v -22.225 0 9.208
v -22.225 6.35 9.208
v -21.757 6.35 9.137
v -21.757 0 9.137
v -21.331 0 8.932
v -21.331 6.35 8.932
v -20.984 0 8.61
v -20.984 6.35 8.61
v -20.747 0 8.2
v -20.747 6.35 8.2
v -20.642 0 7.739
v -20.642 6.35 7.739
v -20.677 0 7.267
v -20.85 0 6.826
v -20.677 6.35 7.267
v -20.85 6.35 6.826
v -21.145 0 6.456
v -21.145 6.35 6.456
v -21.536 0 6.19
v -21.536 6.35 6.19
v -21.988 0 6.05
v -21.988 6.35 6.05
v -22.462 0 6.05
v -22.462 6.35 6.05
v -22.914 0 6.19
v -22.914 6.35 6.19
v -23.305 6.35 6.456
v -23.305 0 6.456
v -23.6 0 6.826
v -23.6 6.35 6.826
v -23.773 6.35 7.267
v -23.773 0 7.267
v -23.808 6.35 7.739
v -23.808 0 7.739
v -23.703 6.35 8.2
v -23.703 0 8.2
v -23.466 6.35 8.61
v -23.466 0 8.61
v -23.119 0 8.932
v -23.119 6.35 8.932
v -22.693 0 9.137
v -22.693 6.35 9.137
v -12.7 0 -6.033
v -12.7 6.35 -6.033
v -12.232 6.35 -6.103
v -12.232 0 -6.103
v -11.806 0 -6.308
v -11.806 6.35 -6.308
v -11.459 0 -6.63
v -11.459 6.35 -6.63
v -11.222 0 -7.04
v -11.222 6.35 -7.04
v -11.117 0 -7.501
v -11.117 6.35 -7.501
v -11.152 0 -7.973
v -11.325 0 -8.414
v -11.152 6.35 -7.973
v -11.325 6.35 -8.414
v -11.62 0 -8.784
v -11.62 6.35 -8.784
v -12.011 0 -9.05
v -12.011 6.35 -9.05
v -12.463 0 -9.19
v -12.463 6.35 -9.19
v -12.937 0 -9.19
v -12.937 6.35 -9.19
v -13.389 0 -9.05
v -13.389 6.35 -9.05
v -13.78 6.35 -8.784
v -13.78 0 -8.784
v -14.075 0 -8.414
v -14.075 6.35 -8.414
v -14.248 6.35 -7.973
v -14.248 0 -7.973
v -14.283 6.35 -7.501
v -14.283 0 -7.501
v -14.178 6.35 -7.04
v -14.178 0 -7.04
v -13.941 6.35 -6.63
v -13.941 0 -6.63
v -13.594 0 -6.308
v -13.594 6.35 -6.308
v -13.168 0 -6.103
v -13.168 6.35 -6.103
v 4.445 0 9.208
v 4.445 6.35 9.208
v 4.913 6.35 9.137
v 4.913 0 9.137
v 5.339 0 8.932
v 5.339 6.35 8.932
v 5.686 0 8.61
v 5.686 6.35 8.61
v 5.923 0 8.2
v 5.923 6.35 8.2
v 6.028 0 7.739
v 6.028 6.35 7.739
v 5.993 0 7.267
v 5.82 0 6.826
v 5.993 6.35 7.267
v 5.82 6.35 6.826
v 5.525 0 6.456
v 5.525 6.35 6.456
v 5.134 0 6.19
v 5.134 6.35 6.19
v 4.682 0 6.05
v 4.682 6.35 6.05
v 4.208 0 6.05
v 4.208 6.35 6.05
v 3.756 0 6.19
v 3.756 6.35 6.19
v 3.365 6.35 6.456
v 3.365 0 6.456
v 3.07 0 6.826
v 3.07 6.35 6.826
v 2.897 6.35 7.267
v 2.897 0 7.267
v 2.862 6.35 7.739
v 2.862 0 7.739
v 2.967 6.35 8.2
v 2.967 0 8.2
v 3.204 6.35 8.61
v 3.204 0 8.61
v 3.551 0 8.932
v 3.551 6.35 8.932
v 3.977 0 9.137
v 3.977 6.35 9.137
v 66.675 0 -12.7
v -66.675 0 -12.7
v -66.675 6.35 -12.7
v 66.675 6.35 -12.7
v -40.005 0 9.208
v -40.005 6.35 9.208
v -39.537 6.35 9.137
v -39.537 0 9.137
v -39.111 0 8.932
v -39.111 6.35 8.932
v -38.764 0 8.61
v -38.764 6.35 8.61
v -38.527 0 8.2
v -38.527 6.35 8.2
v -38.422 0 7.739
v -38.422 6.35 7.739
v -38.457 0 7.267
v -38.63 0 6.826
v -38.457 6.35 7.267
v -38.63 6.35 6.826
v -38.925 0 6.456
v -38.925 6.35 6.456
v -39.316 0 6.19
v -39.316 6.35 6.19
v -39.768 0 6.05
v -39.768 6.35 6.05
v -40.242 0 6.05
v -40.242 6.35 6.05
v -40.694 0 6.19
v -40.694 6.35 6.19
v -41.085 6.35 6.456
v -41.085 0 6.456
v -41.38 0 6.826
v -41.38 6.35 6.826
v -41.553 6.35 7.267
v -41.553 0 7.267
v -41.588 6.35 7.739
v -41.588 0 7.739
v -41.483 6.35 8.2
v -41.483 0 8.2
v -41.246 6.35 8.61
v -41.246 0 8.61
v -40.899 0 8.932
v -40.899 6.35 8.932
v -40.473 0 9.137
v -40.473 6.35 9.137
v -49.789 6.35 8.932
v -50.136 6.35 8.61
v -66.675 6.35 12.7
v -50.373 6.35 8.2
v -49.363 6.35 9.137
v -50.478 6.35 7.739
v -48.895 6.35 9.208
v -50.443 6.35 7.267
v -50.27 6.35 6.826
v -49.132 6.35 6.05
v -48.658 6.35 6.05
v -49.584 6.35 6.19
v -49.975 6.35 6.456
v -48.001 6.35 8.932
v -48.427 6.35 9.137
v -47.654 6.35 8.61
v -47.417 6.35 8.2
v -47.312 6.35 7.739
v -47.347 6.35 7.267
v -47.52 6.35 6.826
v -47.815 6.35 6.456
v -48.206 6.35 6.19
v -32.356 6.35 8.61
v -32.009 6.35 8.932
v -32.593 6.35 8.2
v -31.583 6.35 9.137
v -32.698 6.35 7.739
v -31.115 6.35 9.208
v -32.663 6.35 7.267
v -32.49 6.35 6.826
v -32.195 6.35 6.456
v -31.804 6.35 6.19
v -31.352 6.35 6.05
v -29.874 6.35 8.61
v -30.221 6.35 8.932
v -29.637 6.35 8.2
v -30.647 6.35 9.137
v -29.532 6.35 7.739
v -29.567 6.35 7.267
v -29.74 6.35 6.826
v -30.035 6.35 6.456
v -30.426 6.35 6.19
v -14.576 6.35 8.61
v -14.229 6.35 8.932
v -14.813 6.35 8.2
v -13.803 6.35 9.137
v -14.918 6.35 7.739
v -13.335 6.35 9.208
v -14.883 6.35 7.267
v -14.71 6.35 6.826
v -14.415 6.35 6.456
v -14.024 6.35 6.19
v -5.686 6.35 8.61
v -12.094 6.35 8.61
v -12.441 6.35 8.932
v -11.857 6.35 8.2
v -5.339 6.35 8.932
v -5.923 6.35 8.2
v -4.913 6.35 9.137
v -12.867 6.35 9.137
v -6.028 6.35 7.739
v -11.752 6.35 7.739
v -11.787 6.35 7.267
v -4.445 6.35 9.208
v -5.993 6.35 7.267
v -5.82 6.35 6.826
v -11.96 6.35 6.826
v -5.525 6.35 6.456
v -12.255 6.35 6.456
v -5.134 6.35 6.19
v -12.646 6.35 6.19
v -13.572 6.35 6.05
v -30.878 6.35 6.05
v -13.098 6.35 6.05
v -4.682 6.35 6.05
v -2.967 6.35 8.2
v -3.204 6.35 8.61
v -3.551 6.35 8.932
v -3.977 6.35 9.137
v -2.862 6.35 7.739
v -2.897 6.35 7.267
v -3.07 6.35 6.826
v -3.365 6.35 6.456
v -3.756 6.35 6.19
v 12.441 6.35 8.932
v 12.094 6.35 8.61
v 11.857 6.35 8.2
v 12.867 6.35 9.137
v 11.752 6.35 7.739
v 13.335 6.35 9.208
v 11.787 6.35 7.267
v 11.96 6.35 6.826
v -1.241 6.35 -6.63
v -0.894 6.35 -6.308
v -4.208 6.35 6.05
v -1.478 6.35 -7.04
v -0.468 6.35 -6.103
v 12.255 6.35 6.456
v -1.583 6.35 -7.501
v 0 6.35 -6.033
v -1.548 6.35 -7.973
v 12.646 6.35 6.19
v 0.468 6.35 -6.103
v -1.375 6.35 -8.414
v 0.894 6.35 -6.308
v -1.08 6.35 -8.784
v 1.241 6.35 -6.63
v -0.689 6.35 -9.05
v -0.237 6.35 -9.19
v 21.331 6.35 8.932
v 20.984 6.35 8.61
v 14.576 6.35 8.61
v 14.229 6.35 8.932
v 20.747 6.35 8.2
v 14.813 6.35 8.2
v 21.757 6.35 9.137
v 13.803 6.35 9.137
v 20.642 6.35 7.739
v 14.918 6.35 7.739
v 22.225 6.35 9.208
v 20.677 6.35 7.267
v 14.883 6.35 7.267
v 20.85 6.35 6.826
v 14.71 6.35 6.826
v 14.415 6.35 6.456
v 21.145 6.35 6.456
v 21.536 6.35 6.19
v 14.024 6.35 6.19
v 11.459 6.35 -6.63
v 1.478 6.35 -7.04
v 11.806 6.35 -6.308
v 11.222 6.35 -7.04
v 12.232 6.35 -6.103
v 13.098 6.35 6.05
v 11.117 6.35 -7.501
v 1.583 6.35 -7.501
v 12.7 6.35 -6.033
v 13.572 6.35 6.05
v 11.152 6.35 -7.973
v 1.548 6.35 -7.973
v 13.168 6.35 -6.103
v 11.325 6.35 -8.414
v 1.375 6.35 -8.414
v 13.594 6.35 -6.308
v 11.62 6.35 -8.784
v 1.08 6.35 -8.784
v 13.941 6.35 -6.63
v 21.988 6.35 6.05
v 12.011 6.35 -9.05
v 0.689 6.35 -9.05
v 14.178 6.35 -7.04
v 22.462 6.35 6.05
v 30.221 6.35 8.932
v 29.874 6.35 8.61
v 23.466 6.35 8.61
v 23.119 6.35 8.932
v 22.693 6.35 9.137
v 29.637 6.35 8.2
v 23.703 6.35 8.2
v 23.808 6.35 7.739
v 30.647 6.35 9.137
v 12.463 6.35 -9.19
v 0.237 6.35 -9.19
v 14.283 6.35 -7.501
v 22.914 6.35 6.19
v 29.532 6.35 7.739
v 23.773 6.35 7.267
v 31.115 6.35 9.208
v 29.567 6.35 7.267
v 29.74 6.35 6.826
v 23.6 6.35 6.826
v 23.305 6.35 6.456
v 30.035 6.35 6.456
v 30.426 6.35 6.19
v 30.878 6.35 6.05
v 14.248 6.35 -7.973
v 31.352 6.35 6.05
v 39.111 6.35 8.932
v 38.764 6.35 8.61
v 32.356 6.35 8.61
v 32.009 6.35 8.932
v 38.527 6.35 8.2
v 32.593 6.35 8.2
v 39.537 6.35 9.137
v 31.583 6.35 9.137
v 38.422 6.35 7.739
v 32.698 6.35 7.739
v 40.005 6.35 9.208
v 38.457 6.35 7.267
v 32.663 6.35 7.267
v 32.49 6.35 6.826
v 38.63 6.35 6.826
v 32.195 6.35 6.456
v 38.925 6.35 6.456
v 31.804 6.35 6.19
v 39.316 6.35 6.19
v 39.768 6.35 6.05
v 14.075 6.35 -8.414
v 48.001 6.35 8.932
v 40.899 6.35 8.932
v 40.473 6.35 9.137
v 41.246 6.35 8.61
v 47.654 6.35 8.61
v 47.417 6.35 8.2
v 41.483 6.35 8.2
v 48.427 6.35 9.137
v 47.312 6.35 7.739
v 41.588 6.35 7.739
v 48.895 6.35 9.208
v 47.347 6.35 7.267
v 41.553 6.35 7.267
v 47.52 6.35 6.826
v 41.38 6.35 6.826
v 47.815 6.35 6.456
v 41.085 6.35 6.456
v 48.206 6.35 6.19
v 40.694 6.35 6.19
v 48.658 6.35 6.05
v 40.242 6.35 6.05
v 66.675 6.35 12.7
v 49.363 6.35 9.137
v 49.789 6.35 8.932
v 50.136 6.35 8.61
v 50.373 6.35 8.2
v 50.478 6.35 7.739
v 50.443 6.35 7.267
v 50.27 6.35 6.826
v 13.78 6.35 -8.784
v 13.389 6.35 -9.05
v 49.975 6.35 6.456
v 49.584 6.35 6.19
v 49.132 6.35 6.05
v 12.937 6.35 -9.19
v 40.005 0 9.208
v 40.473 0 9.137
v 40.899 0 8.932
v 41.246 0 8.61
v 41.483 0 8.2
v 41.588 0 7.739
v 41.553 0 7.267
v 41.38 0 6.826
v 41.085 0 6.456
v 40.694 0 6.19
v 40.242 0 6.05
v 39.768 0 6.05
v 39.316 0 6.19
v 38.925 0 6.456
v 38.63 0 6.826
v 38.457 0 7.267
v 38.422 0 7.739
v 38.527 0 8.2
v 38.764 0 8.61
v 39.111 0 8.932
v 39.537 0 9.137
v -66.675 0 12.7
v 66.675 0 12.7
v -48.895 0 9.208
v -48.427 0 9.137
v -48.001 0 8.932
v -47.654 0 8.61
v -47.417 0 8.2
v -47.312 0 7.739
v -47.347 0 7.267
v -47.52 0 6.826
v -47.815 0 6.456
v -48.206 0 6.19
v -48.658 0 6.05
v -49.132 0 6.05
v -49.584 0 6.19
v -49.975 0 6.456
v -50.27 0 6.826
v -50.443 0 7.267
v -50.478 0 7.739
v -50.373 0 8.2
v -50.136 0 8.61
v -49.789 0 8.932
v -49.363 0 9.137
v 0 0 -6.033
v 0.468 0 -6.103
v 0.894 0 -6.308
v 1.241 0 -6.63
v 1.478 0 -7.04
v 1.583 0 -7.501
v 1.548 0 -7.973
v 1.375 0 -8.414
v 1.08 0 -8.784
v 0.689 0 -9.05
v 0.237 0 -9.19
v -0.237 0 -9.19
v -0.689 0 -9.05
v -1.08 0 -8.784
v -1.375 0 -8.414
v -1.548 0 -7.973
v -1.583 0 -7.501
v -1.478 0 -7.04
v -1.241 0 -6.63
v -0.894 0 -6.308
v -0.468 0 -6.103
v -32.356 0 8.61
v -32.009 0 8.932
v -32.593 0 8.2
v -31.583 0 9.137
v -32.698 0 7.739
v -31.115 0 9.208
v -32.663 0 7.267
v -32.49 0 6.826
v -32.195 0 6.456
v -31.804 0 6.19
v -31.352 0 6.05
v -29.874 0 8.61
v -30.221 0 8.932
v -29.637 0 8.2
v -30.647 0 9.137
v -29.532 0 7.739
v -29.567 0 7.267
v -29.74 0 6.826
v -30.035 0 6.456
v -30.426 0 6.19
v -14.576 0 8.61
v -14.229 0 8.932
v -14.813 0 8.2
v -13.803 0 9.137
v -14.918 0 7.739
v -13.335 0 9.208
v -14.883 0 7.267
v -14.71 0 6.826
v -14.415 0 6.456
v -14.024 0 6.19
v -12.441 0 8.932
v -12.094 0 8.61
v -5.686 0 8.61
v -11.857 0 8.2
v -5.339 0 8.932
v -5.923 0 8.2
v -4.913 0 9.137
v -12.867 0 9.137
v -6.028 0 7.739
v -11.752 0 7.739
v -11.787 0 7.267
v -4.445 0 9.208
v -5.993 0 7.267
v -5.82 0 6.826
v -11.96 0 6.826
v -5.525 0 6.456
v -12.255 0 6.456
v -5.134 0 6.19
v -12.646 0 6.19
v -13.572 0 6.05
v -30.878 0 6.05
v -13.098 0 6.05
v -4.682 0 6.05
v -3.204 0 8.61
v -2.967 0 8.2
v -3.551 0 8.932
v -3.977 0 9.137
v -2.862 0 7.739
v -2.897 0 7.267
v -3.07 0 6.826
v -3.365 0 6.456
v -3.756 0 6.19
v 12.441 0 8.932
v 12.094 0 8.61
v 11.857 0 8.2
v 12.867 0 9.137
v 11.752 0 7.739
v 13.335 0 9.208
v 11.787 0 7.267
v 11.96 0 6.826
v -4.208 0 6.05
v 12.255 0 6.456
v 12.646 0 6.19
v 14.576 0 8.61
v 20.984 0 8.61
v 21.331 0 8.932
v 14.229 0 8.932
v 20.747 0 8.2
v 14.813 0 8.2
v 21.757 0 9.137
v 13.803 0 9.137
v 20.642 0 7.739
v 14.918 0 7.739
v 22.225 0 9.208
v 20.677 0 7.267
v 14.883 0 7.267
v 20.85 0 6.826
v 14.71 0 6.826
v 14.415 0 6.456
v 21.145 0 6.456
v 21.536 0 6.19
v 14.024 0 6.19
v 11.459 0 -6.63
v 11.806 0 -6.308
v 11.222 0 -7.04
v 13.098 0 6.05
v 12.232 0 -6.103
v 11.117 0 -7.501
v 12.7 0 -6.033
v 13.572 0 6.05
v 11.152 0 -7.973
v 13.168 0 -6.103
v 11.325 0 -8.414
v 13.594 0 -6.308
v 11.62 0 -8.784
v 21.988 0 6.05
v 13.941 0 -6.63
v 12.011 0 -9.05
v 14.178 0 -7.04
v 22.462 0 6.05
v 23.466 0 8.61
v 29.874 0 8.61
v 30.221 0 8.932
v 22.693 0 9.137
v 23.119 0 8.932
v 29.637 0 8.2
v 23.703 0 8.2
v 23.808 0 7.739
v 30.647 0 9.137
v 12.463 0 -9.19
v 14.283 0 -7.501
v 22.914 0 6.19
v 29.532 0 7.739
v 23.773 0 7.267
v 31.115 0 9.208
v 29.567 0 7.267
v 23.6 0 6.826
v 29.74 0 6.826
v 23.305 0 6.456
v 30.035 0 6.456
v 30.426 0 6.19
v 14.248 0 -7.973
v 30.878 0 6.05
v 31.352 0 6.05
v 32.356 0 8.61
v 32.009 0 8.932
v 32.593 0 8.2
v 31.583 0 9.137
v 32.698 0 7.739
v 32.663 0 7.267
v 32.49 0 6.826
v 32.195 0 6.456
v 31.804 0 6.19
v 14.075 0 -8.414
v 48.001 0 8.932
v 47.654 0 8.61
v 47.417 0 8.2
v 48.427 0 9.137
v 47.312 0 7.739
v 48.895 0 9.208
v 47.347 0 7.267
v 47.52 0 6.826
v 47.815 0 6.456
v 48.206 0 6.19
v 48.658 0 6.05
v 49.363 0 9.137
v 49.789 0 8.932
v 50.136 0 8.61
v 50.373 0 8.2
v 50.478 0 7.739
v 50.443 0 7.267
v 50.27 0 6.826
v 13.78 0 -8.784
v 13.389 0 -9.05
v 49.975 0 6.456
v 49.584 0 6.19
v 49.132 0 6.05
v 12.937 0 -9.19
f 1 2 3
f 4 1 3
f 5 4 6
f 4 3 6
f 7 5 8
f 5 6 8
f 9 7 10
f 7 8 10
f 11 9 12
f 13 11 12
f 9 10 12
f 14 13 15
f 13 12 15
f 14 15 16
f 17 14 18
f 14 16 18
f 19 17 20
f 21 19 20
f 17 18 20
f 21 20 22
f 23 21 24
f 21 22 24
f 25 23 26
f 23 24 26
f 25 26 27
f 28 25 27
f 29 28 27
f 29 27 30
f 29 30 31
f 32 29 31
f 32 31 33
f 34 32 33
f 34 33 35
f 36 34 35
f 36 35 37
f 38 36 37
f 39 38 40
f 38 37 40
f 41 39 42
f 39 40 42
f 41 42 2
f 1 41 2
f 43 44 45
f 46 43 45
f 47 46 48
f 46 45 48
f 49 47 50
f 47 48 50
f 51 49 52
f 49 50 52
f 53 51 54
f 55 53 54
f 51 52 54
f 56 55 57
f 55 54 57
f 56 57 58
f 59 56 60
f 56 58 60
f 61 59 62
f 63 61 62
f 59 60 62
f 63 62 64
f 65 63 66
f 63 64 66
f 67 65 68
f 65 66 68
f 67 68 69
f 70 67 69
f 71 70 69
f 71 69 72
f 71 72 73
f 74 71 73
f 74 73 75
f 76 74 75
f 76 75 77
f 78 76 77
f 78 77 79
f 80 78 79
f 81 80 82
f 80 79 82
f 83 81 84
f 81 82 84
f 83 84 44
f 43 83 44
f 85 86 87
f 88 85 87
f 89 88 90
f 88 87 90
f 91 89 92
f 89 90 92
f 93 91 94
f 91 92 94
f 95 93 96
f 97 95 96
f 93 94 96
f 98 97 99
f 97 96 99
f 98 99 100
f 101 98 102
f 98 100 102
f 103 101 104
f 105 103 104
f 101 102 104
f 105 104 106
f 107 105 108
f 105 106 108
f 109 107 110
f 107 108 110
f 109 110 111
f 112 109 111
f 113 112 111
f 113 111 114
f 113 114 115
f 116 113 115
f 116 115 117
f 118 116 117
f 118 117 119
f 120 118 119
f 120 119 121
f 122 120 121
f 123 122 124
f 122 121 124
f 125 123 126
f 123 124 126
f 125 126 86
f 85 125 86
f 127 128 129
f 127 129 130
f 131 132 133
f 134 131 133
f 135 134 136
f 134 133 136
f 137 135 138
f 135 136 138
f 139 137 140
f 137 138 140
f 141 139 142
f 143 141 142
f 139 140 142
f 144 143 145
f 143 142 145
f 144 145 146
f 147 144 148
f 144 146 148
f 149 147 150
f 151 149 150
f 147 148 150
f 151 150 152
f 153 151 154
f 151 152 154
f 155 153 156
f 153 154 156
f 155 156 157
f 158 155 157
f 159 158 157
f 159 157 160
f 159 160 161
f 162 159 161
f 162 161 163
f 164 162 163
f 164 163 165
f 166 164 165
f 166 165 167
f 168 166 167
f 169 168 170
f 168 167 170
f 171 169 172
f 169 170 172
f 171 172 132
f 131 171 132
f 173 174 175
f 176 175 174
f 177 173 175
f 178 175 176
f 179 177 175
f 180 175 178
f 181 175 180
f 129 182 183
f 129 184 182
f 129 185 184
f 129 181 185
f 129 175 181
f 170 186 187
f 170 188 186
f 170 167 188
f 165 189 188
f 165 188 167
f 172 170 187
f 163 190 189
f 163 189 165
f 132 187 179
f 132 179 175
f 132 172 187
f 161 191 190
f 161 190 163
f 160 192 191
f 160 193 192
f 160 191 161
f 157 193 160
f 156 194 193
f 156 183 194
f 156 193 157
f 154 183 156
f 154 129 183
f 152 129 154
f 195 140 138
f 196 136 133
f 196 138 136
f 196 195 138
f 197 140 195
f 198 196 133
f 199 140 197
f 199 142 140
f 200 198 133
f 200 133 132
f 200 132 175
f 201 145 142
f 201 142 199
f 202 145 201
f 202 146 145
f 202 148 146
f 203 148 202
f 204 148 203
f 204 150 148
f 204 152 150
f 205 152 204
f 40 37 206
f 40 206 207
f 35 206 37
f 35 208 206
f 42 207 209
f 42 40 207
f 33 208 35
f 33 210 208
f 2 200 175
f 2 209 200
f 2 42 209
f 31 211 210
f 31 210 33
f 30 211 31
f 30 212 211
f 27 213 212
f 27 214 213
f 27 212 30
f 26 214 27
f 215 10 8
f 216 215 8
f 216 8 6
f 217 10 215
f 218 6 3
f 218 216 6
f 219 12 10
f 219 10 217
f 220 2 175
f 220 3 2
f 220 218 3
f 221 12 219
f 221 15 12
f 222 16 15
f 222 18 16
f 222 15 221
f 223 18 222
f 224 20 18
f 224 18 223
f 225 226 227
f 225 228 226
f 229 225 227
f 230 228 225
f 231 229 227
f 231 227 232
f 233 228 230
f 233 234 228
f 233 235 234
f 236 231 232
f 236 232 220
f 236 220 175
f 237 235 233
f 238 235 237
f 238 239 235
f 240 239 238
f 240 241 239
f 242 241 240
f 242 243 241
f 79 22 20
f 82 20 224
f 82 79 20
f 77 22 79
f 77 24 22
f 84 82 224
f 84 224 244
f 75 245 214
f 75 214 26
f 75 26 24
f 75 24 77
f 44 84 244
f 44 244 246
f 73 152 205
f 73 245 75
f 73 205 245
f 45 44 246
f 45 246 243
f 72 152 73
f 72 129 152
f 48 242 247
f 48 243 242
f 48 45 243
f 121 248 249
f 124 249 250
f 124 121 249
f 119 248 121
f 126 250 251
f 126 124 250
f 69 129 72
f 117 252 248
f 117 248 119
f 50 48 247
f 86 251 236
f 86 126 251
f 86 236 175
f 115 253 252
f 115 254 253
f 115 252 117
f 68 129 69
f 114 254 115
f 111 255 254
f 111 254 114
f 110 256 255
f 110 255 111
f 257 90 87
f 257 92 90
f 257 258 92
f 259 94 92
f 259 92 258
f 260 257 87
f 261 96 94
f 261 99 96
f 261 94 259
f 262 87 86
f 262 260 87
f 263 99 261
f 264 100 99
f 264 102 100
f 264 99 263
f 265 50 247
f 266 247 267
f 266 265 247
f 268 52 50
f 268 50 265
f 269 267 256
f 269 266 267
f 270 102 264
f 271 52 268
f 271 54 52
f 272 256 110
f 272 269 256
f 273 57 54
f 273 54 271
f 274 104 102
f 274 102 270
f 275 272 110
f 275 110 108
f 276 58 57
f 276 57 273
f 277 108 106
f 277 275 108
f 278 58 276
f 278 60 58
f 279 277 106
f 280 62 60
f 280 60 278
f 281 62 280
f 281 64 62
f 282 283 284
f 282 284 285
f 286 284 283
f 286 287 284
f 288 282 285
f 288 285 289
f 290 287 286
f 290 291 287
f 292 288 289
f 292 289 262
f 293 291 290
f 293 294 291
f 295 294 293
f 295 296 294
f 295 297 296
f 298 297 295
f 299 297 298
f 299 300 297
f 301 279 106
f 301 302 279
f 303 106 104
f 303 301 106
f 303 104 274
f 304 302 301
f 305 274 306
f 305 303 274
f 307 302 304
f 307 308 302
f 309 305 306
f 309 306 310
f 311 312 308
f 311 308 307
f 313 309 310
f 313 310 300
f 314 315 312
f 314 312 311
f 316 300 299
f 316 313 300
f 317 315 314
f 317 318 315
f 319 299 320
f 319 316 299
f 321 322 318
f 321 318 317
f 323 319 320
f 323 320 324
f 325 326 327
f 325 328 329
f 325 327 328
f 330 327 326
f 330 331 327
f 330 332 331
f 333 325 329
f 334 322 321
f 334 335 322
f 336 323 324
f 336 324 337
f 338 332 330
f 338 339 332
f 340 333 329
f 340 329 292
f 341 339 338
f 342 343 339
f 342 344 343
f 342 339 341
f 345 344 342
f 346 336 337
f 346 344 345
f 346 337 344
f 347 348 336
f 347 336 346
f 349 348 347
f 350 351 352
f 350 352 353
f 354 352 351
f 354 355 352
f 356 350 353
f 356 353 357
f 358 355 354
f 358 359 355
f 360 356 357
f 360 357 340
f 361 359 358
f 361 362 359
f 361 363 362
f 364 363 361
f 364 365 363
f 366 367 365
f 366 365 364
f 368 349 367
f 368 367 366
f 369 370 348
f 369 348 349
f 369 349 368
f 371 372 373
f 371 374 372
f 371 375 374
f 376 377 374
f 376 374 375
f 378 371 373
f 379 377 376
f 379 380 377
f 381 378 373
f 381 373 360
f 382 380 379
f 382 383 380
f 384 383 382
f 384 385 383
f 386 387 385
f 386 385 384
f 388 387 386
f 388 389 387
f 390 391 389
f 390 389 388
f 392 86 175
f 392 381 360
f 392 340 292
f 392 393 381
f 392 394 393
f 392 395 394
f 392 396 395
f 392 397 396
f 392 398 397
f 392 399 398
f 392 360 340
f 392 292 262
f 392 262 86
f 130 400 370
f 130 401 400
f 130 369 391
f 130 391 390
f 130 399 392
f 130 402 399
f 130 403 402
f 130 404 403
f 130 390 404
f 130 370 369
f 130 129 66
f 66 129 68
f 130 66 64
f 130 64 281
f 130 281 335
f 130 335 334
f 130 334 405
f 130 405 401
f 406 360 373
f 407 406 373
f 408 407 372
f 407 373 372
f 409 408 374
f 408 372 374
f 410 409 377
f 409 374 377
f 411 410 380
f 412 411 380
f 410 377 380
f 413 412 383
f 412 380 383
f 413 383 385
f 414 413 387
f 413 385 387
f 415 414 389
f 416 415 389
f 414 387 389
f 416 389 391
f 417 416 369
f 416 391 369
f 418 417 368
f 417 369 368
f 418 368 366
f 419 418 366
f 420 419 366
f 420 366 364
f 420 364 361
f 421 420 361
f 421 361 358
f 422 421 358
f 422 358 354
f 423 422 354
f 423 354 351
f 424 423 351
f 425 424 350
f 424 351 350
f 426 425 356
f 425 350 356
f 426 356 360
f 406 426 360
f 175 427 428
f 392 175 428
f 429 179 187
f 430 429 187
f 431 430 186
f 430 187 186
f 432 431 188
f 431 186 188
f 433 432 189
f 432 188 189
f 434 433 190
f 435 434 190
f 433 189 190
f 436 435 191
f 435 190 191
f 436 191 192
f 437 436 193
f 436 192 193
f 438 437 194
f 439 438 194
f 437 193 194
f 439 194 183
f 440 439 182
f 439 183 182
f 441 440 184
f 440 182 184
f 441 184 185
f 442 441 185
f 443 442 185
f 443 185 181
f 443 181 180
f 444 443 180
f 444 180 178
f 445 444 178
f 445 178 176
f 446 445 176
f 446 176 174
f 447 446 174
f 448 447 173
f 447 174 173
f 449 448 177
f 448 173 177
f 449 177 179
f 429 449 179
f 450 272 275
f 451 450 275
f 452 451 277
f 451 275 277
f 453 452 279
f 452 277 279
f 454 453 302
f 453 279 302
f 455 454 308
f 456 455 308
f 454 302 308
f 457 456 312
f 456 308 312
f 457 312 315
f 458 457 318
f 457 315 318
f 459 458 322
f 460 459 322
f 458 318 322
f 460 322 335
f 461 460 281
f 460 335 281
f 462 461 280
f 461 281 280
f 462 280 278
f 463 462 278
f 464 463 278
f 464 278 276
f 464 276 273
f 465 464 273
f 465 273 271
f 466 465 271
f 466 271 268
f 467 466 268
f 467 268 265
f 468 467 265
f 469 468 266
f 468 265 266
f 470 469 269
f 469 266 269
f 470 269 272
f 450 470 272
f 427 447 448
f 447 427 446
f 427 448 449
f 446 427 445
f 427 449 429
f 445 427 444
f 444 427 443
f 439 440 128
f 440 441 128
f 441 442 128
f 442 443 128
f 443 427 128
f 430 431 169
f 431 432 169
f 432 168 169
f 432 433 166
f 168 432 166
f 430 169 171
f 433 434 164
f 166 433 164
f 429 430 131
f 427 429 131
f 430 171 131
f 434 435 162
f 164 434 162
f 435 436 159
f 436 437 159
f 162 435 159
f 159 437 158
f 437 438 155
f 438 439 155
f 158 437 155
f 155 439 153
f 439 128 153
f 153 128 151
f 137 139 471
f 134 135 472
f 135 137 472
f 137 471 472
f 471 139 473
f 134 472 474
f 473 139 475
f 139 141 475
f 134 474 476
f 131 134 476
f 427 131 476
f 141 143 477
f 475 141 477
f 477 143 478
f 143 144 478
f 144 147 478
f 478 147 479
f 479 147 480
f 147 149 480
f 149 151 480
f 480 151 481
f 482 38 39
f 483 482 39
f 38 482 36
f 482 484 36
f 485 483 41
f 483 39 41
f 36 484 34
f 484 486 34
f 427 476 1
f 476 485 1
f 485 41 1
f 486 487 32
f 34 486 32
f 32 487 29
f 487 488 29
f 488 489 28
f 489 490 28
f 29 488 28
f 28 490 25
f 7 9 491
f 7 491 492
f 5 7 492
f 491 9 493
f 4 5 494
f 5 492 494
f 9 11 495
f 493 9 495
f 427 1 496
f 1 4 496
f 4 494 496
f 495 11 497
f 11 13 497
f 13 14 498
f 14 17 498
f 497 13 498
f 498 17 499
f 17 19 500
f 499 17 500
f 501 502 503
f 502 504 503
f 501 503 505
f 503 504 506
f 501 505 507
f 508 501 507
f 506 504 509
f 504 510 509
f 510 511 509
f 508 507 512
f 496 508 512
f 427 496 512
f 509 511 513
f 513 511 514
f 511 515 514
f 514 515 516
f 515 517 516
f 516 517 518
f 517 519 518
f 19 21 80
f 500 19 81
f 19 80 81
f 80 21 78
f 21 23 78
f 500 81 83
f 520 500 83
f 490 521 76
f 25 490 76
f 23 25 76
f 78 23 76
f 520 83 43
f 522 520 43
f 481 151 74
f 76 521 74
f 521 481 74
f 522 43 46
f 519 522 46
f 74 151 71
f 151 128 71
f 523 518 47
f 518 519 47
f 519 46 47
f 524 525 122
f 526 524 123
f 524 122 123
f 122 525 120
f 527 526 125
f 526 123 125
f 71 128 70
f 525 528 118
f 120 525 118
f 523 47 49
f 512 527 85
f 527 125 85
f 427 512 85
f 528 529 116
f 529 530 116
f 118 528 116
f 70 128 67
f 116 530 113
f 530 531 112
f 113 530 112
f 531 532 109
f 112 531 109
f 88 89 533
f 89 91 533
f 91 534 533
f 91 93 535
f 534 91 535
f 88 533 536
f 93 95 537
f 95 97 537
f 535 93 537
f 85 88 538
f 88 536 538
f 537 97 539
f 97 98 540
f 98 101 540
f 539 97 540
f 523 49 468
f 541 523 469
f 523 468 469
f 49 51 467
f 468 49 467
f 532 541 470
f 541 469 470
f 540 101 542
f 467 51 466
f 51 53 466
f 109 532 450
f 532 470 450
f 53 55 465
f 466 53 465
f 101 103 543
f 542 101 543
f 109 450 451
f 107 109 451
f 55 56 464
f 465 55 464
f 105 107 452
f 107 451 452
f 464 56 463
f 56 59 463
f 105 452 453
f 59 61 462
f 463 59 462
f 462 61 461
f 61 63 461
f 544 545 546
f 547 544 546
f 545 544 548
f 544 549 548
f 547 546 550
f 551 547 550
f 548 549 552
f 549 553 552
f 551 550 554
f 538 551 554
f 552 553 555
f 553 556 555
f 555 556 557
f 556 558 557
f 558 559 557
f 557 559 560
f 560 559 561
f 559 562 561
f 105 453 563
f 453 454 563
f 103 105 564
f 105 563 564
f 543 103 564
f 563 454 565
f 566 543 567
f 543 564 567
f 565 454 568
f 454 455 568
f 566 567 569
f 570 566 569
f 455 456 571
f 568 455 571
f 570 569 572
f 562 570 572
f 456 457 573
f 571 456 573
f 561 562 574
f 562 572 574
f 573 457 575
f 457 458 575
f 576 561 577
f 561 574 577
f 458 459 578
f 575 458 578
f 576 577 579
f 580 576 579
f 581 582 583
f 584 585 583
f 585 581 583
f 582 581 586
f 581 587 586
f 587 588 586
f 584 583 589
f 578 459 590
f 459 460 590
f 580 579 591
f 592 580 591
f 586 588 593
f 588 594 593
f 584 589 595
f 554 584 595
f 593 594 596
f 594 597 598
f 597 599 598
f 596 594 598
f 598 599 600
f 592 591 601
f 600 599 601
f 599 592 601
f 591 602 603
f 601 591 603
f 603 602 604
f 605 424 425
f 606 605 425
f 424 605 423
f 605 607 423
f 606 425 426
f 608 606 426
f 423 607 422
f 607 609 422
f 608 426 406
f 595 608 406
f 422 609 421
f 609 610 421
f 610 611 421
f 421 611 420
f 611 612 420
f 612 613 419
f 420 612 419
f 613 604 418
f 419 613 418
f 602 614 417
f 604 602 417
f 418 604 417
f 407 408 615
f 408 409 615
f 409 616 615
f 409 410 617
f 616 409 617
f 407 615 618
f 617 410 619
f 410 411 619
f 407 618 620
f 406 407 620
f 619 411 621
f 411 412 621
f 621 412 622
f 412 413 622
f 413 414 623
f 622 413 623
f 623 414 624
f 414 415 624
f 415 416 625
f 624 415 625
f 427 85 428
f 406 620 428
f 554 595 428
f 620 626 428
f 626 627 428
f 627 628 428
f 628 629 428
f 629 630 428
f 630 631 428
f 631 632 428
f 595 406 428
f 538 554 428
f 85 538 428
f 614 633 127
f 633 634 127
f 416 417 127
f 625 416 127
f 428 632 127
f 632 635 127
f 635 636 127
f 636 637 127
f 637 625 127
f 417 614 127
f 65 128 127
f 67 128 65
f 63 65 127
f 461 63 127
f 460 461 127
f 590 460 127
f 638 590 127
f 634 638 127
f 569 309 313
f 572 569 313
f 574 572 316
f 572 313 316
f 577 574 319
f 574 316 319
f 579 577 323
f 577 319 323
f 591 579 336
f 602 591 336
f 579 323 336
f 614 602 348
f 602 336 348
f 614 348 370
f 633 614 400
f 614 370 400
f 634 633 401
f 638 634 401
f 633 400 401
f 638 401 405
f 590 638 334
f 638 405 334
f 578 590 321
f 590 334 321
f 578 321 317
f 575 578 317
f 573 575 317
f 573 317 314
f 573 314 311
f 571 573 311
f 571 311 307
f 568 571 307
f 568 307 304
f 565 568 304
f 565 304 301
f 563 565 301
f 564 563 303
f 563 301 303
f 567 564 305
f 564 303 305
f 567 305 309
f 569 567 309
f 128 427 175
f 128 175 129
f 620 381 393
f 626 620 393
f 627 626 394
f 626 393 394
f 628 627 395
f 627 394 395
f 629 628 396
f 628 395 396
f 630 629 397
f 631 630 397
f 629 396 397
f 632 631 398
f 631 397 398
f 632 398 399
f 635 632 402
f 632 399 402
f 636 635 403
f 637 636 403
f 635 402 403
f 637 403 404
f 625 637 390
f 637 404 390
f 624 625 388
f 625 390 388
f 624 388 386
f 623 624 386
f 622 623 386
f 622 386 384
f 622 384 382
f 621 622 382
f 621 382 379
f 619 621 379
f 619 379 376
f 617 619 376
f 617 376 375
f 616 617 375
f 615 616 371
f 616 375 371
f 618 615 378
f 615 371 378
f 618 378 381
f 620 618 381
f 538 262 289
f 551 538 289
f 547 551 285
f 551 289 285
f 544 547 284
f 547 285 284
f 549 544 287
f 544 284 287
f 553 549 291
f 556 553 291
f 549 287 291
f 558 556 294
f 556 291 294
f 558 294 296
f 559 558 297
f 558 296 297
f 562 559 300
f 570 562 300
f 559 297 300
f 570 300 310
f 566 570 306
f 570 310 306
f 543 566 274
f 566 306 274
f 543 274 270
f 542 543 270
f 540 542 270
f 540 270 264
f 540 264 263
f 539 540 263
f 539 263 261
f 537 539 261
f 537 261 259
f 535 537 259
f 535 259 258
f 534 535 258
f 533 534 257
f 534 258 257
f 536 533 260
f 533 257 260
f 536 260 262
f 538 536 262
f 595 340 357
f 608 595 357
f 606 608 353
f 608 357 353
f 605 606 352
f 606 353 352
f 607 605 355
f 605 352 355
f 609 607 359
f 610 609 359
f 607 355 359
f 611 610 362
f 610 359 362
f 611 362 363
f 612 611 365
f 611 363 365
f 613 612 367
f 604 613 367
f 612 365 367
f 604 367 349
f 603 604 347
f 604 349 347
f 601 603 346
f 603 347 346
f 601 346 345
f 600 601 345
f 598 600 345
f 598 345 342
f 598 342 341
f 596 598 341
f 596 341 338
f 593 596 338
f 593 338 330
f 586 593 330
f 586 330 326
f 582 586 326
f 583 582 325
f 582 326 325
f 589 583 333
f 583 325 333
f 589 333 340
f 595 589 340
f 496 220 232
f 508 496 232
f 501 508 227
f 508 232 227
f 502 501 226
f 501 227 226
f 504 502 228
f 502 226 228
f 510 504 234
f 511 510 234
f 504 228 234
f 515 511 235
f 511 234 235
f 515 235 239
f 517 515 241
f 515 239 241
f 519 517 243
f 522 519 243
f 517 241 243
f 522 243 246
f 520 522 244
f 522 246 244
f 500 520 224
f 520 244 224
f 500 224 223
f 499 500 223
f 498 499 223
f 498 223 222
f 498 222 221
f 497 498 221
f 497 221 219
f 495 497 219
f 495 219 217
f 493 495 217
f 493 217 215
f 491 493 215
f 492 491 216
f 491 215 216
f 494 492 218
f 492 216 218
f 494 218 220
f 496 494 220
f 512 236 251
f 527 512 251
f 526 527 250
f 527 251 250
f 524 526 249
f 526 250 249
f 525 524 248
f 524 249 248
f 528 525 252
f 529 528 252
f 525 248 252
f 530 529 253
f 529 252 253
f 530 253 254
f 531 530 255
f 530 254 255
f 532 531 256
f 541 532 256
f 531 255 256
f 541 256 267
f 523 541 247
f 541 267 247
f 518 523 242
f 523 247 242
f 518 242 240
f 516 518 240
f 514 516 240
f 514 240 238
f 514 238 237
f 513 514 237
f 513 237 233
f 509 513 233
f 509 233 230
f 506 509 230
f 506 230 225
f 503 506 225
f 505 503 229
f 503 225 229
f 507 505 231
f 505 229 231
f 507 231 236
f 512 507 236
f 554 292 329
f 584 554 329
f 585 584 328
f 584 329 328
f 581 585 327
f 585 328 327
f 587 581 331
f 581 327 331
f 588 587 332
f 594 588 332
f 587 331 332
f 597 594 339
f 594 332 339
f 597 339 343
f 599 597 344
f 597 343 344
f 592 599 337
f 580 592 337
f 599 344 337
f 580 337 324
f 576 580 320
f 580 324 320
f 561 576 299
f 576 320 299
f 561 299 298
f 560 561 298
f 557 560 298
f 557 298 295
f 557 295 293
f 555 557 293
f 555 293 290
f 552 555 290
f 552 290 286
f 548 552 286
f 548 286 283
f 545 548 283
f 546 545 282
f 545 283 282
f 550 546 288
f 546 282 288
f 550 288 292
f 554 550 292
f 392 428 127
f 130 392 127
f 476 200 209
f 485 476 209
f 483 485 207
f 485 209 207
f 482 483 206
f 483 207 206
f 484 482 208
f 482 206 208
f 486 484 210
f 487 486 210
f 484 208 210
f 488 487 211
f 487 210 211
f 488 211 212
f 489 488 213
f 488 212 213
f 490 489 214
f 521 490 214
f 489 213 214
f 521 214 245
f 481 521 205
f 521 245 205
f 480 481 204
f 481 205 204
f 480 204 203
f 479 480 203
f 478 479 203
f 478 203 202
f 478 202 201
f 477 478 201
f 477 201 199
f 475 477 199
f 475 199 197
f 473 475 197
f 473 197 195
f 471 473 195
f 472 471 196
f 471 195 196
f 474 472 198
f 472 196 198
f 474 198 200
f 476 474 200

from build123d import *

# Parameters (mm, degrees)
SKETCH1_W           = 133.35
SKETCH1_H           = 25.4
BOSS_EXTRUDE1_DEPTH = 6.35
SKETCH2_R           = 1.5875
CUT_EXTRUDE1_DEPTH  = 6.35


with BuildPart() as part:
    # Sketch1 → Boss-Extrude1 (new body)
    with BuildSketch(Plane(origin=(0, 0, 0), x_dir=(1, 0, 0), z_dir=(0, 1, 0))):
        Rectangle(SKETCH1_W, SKETCH1_H)
    extrude(amount=BOSS_EXTRUDE1_DEPTH)

    # Sketch2 → Cut-Extrude1 (cut)
    with BuildSketch(Plane(origin=(0, 6.35, 0), x_dir=(1, 0, 0), z_dir=(0, 1, 0))):
        with Locations(Location((0, 7.62, 0), (0, 0, 270))):
            Circle(SKETCH2_R)
        with Locations(Location((-12.7, 7.62, 0), (0, 0, 270))):
            Circle(SKETCH2_R)
        with Locations(Location((12.7, 7.62, 0), (0, 0, 270))):
            Circle(SKETCH2_R)
        with Locations(Location((-48.895, -7.62, 0), (0, 0, 270))):
            Circle(SKETCH2_R)
        with Locations(Location((-40.005, -7.62, 0), (0, 0, 270))):
            Circle(SKETCH2_R)
        with Locations(Location((-31.115, -7.62, 0), (0, 0, 270))):
            Circle(SKETCH2_R)
        with Locations(Location((-13.335, -7.62, 0), (0, 0, 270))):
            Circle(SKETCH2_R)
        with Locations(Location((-22.225, -7.62, 0), (0, 0, 270))):
            Circle(SKETCH2_R)
        with Locations(Location((-4.445, -7.62, 0), (0, 0, 270))):
            Circle(SKETCH2_R)
        with Locations(Location((4.445, -7.62, 0), (0, 0, 270))):
            Circle(SKETCH2_R)
        with Locations(Location((13.335, -7.62, 0), (0, 0, 270))):
            Circle(SKETCH2_R)
        with Locations(Location((22.225, -7.62, 0), (0, 0, 270))):
            Circle(SKETCH2_R)
        with Locations(Location((31.115, -7.62, 0), (0, 0, 270))):
            Circle(SKETCH2_R)
        with Locations(Location((40.005, -7.62, 0), (0, 0, 270))):
            Circle(SKETCH2_R)
        with Locations(Location((48.895, -7.62, 0), (0, 0, 270))):
            Circle(SKETCH2_R)
    extrude(amount=-CUT_EXTRUDE1_DEPTH, mode=Mode.SUBTRACT)


solid = part.part
